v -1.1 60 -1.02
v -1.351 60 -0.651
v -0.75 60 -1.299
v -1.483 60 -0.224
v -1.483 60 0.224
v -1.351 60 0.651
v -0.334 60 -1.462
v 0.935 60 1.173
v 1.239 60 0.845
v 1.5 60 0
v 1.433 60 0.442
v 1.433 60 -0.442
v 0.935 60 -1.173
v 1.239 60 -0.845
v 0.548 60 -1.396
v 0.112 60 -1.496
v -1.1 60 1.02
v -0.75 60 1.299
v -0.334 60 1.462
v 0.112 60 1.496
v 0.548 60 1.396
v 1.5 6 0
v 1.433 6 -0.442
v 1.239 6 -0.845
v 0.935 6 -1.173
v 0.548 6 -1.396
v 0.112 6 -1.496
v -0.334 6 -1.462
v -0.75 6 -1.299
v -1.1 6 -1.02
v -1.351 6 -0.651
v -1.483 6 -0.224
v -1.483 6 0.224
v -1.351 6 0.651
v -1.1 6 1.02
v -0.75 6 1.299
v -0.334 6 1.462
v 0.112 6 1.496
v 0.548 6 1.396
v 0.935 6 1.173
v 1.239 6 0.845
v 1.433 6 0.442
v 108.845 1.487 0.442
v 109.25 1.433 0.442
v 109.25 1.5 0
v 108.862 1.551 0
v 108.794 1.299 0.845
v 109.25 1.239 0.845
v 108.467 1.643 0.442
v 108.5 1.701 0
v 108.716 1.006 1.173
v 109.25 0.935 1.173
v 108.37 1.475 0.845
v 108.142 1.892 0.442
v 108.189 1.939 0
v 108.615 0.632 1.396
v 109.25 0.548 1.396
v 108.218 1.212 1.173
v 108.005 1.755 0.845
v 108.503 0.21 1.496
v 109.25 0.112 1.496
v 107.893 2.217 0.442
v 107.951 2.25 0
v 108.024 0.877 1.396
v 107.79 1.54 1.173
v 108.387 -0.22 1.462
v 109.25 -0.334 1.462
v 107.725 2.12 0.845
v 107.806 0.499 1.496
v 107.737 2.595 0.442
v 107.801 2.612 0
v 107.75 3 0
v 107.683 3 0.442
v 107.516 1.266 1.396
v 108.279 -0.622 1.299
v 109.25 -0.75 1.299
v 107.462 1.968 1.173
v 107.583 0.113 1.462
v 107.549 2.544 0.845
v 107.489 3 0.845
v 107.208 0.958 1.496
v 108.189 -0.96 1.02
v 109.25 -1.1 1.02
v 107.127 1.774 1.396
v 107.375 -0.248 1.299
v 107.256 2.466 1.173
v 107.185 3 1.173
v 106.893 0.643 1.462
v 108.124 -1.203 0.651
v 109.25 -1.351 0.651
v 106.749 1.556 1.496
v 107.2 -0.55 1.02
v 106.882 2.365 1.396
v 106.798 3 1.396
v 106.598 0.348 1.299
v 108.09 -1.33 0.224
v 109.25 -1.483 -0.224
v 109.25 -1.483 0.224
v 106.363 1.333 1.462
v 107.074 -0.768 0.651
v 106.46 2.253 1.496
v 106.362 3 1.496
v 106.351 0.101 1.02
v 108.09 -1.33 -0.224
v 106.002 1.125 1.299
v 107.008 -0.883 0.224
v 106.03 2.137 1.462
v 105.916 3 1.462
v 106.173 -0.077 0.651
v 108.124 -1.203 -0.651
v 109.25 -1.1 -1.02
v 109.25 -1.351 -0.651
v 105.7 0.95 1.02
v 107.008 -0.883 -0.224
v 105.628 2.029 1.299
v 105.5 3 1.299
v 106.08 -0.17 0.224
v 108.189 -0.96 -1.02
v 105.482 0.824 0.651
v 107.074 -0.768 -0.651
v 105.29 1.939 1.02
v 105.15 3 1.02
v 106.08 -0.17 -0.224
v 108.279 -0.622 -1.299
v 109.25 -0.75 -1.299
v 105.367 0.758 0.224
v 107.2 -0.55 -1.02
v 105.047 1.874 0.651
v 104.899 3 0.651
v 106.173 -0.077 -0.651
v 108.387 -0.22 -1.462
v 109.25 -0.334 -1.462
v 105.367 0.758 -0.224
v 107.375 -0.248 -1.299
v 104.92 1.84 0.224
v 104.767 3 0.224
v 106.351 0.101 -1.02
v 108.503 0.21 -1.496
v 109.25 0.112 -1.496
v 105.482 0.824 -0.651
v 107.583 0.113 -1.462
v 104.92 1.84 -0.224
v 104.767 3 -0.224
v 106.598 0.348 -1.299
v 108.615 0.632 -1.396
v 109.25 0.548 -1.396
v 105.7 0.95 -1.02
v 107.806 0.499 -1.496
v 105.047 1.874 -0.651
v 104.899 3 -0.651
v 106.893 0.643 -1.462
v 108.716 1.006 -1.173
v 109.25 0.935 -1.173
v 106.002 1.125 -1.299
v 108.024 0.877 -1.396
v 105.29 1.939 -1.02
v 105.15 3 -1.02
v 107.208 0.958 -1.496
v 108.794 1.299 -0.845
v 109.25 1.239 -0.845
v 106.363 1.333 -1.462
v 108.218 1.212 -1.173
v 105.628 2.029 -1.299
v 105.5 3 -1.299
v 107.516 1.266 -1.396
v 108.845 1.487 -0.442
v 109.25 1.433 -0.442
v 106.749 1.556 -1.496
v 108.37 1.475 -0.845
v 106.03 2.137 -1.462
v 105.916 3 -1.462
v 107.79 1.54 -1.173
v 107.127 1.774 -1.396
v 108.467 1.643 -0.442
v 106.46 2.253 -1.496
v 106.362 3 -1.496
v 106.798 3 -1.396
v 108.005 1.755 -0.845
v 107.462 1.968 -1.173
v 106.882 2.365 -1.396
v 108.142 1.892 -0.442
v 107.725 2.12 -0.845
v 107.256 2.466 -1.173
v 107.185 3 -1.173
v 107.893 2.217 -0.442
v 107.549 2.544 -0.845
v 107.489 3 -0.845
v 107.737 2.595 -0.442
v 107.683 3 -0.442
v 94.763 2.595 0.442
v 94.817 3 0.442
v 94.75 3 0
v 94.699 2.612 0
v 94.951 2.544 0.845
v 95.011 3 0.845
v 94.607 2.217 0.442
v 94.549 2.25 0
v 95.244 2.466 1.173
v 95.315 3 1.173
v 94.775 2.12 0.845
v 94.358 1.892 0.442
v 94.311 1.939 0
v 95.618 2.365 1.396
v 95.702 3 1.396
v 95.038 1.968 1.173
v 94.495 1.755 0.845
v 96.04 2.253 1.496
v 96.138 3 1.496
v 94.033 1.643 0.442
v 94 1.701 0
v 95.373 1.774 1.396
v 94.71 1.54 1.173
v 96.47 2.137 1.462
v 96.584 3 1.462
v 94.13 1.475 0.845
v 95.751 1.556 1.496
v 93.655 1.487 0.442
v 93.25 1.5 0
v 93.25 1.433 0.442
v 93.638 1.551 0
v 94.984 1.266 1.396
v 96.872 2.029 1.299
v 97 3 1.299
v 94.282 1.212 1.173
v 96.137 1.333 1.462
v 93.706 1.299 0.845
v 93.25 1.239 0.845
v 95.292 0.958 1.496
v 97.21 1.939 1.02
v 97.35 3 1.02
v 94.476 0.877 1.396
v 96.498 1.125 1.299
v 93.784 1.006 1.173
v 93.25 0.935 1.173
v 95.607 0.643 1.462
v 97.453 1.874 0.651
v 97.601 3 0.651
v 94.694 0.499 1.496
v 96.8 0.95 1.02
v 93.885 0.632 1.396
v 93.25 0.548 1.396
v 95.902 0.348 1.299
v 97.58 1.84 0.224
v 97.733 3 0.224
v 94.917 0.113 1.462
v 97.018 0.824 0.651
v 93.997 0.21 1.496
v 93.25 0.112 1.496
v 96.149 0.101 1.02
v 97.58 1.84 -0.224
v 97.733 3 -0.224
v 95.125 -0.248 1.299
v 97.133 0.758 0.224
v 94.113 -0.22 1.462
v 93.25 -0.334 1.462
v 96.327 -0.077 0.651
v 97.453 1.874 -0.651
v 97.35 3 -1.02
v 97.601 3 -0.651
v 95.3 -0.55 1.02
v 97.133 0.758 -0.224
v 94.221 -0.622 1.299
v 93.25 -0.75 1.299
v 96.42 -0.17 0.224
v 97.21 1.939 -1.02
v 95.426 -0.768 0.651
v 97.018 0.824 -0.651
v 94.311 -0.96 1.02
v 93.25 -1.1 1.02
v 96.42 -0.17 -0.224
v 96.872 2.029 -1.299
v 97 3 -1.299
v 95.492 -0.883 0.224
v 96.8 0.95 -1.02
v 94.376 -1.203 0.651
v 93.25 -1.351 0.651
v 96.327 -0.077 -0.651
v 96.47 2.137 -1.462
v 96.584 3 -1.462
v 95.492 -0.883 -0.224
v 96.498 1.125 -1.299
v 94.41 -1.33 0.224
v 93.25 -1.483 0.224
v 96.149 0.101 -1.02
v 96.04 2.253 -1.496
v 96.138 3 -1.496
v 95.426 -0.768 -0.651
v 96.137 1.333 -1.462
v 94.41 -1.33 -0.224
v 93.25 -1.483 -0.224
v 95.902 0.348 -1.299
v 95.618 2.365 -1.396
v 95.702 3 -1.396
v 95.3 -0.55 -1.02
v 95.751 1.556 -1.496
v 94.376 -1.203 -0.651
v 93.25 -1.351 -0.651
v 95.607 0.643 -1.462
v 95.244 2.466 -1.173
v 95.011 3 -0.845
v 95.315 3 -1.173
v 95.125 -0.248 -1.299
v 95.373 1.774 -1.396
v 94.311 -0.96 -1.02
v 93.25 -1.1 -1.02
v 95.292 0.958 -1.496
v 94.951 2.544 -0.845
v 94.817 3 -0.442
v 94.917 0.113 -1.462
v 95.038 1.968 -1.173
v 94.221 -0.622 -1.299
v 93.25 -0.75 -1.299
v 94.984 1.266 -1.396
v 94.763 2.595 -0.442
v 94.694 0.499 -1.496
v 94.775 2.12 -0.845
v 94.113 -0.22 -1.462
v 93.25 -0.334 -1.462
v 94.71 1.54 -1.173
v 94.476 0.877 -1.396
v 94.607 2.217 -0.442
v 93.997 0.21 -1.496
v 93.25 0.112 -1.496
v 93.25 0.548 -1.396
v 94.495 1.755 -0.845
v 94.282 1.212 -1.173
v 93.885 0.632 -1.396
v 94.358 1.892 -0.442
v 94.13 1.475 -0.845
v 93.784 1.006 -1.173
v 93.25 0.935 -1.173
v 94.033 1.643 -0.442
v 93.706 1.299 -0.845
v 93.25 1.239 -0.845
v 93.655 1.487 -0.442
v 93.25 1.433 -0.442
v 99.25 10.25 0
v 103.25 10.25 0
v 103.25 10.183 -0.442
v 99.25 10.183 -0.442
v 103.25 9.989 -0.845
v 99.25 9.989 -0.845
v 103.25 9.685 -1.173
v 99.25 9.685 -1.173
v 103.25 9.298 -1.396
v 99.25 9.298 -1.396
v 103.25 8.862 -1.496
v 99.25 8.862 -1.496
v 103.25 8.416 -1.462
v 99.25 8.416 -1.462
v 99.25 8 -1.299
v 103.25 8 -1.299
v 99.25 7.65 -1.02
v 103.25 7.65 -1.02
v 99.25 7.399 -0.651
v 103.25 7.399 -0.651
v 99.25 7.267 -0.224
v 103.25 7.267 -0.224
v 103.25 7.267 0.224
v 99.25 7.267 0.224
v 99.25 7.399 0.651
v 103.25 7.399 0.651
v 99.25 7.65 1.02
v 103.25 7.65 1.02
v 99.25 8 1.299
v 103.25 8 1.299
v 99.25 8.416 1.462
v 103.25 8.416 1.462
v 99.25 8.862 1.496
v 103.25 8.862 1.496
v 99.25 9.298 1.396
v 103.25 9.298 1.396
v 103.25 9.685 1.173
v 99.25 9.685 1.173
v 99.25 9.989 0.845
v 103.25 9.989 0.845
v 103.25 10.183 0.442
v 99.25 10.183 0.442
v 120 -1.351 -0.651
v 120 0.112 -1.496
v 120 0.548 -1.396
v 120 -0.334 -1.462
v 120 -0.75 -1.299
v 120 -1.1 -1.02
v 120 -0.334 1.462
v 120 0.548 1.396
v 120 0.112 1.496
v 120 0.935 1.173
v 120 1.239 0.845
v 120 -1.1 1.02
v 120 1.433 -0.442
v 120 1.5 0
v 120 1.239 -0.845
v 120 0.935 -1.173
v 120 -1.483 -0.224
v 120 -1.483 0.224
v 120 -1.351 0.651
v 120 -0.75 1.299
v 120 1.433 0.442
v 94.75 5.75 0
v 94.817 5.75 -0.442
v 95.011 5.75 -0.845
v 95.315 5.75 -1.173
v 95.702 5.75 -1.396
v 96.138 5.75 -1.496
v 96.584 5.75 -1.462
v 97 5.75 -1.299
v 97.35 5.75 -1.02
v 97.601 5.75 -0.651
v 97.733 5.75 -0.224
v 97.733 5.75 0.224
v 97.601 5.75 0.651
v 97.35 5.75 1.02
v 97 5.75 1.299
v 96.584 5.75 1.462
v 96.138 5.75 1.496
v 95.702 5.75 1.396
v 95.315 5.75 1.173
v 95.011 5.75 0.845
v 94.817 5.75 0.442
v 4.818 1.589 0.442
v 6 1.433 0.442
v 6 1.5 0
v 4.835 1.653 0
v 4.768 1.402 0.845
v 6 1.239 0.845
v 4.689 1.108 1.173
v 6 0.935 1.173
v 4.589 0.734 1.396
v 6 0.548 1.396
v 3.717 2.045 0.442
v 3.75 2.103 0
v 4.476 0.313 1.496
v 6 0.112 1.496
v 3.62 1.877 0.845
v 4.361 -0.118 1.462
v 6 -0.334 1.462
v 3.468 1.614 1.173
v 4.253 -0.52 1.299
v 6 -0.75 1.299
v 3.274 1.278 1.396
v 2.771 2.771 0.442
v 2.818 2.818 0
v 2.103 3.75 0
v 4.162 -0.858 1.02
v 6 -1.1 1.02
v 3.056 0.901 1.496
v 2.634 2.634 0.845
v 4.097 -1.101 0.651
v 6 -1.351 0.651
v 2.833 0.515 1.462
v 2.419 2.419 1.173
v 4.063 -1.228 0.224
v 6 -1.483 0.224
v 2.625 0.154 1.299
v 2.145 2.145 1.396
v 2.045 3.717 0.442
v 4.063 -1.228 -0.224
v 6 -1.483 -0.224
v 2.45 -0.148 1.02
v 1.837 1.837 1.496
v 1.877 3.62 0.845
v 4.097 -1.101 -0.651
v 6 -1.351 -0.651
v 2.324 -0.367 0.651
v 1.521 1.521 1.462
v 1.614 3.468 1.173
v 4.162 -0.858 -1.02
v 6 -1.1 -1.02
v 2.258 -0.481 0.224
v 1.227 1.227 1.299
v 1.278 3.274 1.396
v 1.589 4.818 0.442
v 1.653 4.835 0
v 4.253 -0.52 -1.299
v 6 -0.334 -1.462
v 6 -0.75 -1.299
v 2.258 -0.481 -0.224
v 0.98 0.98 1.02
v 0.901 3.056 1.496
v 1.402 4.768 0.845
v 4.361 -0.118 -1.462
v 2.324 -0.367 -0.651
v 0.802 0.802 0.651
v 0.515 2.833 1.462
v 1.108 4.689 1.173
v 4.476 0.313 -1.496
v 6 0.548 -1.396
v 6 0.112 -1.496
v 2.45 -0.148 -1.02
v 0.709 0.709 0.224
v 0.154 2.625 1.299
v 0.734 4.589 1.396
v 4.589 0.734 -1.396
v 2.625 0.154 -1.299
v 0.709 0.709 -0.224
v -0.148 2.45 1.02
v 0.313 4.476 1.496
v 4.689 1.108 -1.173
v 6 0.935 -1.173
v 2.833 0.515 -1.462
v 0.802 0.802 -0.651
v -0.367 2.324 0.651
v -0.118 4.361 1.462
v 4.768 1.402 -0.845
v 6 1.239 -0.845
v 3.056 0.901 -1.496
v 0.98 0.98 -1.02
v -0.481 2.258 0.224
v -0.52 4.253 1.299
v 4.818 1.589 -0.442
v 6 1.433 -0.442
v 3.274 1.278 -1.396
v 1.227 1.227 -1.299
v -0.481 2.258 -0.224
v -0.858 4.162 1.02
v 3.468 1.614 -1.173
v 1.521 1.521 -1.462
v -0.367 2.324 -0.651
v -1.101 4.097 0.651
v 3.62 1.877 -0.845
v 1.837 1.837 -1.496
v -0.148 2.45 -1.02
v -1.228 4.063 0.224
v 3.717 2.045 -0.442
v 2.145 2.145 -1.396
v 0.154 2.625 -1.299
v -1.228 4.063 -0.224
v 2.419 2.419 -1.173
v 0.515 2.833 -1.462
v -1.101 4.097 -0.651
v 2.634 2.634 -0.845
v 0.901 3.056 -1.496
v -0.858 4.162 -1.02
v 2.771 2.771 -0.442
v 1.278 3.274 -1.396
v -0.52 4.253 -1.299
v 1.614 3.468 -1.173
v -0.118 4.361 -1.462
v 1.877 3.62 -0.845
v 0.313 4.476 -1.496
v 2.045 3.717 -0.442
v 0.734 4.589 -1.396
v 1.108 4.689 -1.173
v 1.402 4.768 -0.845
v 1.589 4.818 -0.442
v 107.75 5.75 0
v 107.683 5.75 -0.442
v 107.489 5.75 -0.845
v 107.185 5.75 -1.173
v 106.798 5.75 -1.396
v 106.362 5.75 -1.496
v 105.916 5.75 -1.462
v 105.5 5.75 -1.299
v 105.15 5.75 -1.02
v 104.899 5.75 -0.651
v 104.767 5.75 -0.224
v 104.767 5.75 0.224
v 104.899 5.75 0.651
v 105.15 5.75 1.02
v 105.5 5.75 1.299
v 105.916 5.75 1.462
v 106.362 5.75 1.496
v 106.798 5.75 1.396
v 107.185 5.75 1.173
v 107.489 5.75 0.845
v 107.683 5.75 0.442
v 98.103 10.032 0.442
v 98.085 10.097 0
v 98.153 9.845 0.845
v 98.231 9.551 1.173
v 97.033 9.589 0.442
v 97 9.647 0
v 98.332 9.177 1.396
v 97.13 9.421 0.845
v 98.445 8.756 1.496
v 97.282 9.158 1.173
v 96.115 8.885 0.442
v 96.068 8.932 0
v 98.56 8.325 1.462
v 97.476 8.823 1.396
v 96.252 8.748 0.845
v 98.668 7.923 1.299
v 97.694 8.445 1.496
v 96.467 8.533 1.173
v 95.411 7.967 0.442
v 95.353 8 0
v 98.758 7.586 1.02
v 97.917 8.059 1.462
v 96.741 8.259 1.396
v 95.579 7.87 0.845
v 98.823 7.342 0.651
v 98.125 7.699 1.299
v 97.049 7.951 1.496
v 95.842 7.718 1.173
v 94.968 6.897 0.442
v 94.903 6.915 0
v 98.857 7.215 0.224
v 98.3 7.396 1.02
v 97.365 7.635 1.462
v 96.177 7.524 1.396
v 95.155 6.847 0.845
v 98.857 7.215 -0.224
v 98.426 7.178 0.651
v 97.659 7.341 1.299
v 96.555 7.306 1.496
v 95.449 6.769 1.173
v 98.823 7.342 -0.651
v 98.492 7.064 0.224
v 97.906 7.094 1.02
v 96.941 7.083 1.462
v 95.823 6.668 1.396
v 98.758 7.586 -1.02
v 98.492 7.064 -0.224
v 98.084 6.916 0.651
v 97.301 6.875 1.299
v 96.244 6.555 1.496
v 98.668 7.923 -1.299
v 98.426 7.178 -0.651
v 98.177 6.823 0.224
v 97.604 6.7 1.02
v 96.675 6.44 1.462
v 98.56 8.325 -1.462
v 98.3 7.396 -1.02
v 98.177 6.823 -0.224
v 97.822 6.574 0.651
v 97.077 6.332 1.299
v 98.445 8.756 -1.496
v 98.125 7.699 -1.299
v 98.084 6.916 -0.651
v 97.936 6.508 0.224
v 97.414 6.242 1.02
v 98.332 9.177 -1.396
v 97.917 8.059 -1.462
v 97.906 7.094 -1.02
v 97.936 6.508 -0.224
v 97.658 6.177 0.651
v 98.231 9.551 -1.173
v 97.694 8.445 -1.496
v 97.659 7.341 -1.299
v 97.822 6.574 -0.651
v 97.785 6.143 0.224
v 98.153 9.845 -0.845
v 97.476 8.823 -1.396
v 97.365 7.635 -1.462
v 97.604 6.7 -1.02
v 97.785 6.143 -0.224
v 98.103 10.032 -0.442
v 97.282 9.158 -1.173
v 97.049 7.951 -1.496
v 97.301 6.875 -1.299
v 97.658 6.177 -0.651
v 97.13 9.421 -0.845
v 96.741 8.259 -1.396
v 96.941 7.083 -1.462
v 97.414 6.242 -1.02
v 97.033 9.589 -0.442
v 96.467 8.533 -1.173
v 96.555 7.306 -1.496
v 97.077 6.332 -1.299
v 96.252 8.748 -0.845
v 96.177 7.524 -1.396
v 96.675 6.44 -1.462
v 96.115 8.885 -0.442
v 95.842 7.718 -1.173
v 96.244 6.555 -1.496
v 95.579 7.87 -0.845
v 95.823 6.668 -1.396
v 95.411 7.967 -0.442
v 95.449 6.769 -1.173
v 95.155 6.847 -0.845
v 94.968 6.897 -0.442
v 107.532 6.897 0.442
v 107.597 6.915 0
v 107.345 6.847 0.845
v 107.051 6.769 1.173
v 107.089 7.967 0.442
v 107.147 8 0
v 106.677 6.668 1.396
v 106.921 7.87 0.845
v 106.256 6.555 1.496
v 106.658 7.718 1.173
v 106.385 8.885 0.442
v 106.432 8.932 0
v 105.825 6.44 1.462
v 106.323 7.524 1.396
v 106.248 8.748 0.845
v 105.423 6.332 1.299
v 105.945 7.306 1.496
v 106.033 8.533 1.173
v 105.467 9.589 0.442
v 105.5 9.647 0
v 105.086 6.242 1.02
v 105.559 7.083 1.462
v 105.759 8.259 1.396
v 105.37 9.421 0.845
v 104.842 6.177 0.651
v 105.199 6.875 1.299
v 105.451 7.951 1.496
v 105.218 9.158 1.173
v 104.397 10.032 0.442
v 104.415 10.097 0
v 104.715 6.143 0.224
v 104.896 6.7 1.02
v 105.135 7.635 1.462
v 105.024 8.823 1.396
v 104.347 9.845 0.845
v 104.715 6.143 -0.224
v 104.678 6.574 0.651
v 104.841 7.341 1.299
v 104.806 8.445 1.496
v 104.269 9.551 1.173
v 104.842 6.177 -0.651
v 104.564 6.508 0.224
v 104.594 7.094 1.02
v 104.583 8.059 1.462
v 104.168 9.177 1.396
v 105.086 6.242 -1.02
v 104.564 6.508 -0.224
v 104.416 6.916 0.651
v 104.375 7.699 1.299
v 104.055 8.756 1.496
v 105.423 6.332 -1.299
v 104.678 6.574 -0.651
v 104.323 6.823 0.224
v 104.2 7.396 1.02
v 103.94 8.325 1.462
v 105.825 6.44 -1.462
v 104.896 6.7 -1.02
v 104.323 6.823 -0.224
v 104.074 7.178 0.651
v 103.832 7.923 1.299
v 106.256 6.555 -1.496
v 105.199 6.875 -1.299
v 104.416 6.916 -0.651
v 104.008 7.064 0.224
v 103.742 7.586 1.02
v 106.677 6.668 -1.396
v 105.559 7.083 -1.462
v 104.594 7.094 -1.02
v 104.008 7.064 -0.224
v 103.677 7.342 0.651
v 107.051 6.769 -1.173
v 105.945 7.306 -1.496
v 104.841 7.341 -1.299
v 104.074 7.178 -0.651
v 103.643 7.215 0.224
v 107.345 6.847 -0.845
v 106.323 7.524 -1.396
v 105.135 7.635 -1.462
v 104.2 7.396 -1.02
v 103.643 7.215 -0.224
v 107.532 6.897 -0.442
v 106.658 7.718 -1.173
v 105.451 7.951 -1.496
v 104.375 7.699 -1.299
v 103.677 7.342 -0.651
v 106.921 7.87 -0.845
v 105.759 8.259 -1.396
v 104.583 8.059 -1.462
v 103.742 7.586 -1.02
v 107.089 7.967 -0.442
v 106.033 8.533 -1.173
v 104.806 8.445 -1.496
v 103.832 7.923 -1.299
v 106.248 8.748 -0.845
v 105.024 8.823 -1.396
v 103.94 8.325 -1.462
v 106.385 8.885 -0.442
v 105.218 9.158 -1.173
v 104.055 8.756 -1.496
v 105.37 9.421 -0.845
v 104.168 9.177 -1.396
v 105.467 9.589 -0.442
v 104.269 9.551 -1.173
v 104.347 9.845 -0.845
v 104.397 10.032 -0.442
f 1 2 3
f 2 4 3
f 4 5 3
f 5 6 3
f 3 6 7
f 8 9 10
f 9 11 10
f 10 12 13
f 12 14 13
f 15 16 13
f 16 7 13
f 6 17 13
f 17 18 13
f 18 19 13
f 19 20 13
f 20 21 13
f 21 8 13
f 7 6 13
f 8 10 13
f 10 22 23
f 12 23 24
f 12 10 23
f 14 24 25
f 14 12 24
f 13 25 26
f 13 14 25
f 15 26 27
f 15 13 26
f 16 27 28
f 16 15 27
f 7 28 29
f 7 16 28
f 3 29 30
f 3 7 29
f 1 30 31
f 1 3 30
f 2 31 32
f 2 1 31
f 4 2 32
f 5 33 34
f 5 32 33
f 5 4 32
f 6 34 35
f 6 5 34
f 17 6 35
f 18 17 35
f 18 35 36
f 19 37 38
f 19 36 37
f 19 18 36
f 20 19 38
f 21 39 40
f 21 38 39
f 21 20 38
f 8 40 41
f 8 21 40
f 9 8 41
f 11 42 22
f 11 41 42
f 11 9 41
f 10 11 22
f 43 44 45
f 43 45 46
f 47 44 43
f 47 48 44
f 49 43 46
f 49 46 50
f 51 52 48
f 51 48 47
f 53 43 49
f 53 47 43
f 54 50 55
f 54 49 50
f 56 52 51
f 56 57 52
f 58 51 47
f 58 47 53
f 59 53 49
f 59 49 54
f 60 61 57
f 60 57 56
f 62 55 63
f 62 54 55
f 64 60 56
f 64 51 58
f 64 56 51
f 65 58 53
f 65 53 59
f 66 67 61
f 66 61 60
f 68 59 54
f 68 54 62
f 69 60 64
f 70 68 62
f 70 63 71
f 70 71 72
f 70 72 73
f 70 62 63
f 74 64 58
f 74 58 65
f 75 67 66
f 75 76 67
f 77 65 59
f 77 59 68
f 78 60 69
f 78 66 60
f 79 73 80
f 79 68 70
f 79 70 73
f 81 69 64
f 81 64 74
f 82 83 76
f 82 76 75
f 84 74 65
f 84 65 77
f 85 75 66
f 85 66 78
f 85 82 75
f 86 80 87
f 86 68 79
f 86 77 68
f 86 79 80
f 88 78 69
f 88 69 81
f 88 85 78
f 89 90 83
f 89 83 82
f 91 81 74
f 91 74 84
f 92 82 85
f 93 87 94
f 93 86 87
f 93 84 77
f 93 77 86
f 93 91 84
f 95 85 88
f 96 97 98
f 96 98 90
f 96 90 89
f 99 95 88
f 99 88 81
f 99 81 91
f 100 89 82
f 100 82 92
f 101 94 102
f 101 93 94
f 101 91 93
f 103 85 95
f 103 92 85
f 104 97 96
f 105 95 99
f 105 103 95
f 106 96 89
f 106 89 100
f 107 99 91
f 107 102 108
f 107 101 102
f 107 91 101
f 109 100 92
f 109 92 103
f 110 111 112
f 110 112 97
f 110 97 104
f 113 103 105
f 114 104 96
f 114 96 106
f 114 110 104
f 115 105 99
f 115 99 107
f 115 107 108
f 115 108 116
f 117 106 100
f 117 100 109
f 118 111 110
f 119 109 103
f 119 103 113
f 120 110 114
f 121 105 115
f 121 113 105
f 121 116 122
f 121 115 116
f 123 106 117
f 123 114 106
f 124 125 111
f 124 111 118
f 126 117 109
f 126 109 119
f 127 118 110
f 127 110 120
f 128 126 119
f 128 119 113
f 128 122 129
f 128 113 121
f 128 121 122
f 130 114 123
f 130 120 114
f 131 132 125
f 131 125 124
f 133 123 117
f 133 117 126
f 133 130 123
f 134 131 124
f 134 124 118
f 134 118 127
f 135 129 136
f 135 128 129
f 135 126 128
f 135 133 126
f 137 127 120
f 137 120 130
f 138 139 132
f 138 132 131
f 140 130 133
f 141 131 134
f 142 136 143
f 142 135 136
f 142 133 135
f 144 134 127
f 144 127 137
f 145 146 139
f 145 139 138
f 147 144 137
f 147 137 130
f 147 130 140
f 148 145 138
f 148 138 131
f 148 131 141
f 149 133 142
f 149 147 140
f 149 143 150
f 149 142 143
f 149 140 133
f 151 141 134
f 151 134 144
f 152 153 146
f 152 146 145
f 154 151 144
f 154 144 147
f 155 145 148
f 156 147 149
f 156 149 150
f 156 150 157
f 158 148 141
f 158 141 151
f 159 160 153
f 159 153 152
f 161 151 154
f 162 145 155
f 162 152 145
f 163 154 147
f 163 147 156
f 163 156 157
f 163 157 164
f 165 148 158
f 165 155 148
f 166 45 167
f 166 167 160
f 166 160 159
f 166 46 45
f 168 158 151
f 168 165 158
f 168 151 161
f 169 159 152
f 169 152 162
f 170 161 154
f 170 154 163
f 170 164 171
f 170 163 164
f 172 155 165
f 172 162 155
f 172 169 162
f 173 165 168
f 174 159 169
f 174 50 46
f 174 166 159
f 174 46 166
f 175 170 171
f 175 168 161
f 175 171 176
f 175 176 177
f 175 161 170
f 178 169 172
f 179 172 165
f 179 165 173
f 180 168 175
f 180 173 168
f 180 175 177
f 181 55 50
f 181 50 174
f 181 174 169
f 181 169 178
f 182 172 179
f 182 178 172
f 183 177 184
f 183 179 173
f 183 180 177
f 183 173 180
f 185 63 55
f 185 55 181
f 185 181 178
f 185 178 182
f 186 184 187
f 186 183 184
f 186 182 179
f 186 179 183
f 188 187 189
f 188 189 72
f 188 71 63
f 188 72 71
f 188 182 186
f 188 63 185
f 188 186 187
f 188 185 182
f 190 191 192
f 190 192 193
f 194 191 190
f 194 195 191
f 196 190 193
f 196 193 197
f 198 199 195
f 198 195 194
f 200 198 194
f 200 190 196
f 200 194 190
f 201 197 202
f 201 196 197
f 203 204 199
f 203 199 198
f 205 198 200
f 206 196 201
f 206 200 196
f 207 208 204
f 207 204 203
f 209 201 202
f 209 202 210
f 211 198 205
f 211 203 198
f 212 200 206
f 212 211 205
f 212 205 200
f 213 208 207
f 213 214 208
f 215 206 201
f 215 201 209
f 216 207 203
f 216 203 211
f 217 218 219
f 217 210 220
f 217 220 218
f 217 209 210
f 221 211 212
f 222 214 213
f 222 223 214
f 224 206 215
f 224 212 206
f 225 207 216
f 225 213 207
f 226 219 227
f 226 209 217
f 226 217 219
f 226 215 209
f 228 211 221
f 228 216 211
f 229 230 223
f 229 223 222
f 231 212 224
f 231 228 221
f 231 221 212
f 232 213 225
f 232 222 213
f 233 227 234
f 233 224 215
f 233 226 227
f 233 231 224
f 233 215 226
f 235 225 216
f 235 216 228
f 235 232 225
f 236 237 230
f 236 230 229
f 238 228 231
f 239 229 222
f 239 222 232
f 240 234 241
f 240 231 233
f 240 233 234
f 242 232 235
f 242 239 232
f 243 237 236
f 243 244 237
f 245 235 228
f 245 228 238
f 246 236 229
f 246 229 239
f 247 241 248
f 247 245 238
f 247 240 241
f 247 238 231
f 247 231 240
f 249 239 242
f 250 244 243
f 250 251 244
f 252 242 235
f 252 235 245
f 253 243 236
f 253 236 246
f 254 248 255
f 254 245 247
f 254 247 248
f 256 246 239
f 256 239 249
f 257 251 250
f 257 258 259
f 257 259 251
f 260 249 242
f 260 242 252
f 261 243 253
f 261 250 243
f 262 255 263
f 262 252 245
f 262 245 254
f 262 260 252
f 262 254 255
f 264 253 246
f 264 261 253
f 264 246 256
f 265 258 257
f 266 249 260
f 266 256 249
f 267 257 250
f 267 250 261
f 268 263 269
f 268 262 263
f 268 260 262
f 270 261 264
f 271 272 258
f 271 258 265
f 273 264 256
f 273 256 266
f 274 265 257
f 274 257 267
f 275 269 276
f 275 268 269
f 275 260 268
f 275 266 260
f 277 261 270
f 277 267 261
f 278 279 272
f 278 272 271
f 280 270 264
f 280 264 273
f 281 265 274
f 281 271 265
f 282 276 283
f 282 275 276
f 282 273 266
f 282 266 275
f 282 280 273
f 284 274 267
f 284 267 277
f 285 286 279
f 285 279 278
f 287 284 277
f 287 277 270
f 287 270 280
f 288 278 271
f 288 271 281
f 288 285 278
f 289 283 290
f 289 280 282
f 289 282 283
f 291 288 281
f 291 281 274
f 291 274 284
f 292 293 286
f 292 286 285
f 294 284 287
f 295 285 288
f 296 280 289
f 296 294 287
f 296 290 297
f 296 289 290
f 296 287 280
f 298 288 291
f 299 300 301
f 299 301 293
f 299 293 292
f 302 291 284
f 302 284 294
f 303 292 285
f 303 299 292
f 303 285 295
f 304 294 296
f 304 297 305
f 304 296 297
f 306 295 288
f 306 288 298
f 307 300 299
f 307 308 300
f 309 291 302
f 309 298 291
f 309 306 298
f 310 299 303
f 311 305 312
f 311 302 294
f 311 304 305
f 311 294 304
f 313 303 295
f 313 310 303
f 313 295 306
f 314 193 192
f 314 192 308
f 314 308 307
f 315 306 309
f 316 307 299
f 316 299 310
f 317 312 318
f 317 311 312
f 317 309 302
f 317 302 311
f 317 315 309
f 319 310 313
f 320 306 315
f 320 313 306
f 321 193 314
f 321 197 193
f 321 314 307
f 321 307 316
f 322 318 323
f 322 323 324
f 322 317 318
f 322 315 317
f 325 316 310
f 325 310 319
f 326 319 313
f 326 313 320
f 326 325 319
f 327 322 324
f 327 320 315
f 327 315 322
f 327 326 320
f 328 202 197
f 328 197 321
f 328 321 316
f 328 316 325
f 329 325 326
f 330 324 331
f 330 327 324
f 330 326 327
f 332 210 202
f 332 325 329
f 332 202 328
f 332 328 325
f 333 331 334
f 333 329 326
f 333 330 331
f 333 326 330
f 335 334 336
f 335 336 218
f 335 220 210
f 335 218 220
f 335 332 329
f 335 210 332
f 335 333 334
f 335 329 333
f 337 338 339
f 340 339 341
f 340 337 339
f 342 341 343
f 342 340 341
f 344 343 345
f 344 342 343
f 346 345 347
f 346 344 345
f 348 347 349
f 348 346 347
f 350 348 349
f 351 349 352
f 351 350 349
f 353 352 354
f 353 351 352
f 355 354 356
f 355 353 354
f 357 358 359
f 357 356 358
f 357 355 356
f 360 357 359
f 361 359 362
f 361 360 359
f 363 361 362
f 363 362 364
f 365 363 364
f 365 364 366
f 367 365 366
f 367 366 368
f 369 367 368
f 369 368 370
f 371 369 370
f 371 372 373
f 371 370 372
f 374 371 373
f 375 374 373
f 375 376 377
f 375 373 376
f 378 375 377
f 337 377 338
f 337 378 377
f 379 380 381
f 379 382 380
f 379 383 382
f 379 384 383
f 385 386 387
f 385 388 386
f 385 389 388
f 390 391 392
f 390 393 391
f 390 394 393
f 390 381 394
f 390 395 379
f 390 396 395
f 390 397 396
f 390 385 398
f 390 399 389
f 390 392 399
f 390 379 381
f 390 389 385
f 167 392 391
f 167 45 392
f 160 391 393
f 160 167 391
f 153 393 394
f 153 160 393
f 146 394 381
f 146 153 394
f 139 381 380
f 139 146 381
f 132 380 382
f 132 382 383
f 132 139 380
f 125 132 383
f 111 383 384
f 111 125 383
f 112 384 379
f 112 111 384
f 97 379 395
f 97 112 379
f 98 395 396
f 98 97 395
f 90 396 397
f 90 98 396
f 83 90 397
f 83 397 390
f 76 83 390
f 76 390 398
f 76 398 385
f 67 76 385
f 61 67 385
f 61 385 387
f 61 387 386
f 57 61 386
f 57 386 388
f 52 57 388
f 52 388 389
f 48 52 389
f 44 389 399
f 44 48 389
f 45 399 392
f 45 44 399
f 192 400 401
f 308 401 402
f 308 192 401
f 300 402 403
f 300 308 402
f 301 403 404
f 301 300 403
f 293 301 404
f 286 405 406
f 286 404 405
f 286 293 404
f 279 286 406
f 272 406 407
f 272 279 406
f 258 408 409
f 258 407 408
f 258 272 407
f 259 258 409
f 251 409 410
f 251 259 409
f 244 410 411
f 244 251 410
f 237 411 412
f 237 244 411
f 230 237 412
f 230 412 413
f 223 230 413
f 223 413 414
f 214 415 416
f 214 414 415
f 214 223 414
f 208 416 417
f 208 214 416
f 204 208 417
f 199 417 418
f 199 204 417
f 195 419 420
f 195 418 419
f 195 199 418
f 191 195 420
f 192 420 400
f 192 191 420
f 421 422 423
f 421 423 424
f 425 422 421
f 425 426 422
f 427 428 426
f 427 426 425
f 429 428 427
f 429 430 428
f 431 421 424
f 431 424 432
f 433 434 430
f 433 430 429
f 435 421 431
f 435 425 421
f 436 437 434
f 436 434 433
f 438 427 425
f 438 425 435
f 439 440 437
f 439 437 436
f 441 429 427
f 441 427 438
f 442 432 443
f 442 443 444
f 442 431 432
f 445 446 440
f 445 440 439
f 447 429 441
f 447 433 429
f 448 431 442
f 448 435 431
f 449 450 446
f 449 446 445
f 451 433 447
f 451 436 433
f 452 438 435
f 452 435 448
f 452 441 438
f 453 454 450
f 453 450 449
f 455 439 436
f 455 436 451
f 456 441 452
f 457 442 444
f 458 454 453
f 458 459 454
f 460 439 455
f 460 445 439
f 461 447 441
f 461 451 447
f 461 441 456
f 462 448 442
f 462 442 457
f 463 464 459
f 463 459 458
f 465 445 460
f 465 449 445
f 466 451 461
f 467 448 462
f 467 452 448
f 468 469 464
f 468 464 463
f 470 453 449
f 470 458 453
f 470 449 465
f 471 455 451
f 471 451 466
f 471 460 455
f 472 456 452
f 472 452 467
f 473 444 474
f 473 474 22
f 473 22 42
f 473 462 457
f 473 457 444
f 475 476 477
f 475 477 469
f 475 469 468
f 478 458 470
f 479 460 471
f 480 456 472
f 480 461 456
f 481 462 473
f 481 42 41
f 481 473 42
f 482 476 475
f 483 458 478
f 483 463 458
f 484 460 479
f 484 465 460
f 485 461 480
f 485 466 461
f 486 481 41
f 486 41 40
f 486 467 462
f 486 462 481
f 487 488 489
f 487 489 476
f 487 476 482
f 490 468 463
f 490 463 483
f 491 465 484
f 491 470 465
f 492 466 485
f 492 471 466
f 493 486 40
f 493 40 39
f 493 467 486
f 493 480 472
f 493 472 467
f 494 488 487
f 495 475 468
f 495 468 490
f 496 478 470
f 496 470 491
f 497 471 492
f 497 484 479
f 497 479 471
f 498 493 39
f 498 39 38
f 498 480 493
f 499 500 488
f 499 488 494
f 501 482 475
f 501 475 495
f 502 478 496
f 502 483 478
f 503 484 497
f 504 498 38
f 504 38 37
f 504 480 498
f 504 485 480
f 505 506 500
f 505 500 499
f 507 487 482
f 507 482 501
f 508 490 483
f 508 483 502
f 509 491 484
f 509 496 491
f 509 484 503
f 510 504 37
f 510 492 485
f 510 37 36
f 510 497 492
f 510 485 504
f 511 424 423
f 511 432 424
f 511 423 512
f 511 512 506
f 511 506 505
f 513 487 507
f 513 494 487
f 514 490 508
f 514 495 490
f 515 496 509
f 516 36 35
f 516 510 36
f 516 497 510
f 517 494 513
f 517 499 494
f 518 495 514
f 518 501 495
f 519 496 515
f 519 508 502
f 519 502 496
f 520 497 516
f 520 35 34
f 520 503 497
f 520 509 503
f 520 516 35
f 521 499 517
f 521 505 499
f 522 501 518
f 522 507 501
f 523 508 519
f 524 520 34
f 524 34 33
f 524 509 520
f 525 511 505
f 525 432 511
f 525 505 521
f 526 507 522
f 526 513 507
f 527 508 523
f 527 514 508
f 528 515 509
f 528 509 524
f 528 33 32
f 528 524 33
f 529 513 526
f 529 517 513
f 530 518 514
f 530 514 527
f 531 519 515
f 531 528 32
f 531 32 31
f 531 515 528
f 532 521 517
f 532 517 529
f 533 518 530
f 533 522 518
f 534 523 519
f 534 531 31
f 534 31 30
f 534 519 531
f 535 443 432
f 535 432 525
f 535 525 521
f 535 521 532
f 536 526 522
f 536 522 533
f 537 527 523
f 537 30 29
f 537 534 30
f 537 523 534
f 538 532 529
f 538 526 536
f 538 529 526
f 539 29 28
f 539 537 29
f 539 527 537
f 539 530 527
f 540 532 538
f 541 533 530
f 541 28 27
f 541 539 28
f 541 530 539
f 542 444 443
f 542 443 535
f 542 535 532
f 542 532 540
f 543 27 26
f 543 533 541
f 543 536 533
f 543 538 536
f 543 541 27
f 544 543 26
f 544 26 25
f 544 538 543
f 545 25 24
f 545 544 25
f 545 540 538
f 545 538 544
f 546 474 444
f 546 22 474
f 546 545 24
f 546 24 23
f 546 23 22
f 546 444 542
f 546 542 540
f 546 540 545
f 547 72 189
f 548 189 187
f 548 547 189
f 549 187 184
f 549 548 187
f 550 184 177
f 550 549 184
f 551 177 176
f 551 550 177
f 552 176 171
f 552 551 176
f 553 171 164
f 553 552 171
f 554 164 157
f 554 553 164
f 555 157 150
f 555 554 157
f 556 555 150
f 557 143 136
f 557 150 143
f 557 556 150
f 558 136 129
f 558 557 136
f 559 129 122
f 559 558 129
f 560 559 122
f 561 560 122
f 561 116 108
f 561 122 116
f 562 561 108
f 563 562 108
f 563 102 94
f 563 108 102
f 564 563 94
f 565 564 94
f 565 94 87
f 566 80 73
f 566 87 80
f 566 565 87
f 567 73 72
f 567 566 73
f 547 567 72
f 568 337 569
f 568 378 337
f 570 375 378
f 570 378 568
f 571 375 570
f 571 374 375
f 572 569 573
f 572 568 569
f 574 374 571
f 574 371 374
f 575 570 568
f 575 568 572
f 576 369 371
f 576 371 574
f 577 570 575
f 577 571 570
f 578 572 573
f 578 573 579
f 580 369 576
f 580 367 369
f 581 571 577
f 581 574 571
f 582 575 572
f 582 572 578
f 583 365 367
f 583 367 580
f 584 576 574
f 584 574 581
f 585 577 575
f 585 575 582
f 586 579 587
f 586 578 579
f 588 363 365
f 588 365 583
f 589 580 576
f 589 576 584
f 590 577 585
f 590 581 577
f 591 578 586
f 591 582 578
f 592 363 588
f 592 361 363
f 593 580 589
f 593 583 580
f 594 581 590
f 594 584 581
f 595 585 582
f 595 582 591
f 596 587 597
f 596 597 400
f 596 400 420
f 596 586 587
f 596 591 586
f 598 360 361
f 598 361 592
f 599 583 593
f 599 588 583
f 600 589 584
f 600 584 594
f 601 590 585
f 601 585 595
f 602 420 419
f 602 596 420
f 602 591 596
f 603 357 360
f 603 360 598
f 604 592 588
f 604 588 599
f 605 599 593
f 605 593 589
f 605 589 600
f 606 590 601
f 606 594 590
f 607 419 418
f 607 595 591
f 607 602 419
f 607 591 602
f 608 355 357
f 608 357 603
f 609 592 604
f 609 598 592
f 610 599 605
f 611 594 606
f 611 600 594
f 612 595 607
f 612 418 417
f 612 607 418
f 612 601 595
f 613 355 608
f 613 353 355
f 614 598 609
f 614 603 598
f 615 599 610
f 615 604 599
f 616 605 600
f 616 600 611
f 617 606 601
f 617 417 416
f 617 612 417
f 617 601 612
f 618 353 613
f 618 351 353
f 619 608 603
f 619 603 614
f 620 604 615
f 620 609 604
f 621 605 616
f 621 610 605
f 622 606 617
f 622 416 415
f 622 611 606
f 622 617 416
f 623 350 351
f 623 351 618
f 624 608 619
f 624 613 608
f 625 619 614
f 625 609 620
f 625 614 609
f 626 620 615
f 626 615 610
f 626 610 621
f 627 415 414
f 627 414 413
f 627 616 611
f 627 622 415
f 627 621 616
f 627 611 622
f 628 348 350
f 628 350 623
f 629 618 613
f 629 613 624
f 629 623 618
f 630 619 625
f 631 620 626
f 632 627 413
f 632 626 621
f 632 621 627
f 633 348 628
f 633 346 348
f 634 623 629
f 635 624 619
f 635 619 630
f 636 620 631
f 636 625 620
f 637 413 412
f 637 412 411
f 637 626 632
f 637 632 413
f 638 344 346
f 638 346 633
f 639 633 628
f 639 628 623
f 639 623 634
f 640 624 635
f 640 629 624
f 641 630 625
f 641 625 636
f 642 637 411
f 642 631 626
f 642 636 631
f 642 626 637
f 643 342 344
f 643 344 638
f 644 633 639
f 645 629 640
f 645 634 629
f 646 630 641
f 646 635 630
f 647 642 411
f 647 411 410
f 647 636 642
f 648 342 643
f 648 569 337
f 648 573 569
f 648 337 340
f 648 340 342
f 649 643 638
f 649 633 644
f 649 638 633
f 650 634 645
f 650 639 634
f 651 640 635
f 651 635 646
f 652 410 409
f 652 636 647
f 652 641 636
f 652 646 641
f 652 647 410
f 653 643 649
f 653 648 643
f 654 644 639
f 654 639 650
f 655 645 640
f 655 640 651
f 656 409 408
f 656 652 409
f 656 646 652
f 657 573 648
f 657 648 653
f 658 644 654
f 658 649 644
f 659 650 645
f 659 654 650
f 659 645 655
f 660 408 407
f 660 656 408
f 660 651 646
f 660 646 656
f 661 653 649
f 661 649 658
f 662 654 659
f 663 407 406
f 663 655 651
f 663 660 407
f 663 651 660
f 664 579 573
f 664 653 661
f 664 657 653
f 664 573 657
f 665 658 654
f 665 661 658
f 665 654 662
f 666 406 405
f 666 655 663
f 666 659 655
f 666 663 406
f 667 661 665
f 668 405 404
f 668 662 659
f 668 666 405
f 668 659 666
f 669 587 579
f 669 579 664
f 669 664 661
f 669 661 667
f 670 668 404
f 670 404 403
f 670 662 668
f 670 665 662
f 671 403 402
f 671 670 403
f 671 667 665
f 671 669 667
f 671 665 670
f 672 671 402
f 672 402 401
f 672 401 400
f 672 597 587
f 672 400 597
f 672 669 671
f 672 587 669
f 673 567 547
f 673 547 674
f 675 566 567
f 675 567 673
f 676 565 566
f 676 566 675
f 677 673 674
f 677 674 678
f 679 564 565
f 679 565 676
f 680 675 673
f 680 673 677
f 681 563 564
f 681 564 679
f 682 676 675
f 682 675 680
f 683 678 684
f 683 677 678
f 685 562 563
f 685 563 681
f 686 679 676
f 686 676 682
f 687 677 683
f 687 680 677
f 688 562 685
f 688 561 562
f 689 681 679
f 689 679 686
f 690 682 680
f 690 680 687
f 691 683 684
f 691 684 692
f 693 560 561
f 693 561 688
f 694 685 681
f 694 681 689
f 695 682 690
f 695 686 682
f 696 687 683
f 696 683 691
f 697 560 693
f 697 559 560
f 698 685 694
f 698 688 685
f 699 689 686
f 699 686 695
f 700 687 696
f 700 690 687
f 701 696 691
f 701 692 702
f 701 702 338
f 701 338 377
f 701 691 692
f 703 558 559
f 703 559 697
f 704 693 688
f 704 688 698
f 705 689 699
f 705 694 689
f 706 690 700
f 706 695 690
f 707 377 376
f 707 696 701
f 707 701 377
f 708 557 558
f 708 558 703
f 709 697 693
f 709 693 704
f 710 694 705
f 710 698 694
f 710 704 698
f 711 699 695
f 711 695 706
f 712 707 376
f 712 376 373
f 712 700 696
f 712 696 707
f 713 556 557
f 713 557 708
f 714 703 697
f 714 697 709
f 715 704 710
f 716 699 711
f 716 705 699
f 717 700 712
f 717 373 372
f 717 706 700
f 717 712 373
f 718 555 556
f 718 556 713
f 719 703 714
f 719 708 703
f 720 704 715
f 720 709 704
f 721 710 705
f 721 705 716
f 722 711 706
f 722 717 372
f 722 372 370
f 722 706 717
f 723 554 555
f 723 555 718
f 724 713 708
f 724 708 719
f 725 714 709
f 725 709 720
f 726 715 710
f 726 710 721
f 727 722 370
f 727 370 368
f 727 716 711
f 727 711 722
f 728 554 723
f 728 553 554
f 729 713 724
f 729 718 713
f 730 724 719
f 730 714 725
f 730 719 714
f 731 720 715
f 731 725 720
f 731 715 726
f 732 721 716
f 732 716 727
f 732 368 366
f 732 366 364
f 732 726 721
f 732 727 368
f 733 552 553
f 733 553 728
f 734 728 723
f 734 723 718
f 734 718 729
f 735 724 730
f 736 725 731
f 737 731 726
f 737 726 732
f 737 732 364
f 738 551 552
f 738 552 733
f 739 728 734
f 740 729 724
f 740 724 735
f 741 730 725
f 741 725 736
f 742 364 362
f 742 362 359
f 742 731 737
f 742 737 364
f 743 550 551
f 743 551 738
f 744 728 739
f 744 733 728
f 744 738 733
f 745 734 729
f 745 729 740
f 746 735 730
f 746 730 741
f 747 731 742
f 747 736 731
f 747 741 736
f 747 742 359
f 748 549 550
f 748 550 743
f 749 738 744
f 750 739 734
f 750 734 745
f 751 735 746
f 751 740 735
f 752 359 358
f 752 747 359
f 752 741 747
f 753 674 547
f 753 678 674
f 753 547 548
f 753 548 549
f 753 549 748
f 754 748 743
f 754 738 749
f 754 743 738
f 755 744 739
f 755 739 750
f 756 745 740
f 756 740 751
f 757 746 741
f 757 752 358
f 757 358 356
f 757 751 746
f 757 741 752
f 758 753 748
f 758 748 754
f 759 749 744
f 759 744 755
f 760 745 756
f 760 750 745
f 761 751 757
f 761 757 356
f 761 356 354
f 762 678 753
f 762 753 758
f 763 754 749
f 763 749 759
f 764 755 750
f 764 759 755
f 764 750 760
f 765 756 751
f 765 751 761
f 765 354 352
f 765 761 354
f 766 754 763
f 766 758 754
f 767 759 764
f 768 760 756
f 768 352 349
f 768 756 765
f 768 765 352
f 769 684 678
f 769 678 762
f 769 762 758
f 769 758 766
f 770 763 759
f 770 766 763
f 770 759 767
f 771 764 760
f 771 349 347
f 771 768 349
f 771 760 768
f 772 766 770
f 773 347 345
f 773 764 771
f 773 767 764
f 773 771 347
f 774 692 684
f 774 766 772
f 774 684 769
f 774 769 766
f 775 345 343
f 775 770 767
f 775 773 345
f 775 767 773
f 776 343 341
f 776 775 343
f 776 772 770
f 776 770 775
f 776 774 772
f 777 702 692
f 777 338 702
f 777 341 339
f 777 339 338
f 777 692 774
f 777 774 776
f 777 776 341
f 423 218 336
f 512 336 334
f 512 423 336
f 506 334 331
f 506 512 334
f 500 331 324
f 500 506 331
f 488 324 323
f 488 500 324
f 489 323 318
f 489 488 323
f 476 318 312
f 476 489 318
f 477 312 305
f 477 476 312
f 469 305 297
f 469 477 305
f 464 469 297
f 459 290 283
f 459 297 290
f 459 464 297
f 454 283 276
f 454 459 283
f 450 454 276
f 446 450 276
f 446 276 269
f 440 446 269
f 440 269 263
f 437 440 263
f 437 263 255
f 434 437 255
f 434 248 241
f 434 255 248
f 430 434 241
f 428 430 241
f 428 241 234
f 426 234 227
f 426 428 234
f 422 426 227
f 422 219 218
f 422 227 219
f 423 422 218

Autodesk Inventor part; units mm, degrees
sketch "Sketch1" plane through (0, 0, 0) normal (0, 0, 1) x (1, 0, 0)
  line L0 (0, 6) -> (0, 60)
  line L1 (0, 0) -> (0, 128.6868)
  arc A0 (0, 6) -> (6, 0) centre (6, 6) ccw
  line L2 (120, 0) -> (109.25, 0)
  line L3 (106.25, 3) -> (106.25, 5.75)
  line L4 (103.25, 8.75) -> (99.25, 8.75)
  line L5 (96.25, 5.75) -> (96.25, 3)
  line L6 (93.25, 0) -> (6, 0)
  arc A1 (93.25, 0) -> (96.25, 3) centre (93.25, 3) ccw
  arc A2 (99.25, 8.75) -> (96.25, 5.75) centre (99.25, 5.75) ccw
  arc A3 (106.25, 5.75) -> (103.25, 8.75) centre (103.25, 5.75) ccw
  arc A4 (106.25, 3) -> (109.25, 0) centre (109.25, 3) ccw
  point P0 (106.25, 0)
  point P1 (106.25, 8.75)
  point P2 (96.25, 8.75)
  dimension "d0" = 120
  dimension "d1" = 60
  dimension "d13" = 6
  dimension "d15" = 13.75
  dimension "d16" = 8.75
  dimension "d17" = 10
  dimension "d18" = 3
ref_plane "Work Plane1" through (120, 0, 0) normal (1, 0, 0) x (0, 1, 0)
sketch "Sketch2" plane through (120, 0, 0) normal (1, 0, 0) x (0, 1, 0)
  circle A0 centre (0, 0) radius 1.5
  point P0 (0, 0)
  dimension "d2" = 3
sweep "Sweep1" add profiles "Sketch2" path "Sketch1" path curves L2 A4 L3 A3 L4 A2 L5 A1 L6 A0 L0
thread "Thread1"
ref_plane "Work Plane2" through (0, 0, 0) normal (0, 0, 1) x (1, 0, 0)
thread "Thread2"
ref_plane "Work Plane3" through (0, 0, 0) normal (1, 0, 0) x (0, 1, 0)
properties part number "Barra en L"
